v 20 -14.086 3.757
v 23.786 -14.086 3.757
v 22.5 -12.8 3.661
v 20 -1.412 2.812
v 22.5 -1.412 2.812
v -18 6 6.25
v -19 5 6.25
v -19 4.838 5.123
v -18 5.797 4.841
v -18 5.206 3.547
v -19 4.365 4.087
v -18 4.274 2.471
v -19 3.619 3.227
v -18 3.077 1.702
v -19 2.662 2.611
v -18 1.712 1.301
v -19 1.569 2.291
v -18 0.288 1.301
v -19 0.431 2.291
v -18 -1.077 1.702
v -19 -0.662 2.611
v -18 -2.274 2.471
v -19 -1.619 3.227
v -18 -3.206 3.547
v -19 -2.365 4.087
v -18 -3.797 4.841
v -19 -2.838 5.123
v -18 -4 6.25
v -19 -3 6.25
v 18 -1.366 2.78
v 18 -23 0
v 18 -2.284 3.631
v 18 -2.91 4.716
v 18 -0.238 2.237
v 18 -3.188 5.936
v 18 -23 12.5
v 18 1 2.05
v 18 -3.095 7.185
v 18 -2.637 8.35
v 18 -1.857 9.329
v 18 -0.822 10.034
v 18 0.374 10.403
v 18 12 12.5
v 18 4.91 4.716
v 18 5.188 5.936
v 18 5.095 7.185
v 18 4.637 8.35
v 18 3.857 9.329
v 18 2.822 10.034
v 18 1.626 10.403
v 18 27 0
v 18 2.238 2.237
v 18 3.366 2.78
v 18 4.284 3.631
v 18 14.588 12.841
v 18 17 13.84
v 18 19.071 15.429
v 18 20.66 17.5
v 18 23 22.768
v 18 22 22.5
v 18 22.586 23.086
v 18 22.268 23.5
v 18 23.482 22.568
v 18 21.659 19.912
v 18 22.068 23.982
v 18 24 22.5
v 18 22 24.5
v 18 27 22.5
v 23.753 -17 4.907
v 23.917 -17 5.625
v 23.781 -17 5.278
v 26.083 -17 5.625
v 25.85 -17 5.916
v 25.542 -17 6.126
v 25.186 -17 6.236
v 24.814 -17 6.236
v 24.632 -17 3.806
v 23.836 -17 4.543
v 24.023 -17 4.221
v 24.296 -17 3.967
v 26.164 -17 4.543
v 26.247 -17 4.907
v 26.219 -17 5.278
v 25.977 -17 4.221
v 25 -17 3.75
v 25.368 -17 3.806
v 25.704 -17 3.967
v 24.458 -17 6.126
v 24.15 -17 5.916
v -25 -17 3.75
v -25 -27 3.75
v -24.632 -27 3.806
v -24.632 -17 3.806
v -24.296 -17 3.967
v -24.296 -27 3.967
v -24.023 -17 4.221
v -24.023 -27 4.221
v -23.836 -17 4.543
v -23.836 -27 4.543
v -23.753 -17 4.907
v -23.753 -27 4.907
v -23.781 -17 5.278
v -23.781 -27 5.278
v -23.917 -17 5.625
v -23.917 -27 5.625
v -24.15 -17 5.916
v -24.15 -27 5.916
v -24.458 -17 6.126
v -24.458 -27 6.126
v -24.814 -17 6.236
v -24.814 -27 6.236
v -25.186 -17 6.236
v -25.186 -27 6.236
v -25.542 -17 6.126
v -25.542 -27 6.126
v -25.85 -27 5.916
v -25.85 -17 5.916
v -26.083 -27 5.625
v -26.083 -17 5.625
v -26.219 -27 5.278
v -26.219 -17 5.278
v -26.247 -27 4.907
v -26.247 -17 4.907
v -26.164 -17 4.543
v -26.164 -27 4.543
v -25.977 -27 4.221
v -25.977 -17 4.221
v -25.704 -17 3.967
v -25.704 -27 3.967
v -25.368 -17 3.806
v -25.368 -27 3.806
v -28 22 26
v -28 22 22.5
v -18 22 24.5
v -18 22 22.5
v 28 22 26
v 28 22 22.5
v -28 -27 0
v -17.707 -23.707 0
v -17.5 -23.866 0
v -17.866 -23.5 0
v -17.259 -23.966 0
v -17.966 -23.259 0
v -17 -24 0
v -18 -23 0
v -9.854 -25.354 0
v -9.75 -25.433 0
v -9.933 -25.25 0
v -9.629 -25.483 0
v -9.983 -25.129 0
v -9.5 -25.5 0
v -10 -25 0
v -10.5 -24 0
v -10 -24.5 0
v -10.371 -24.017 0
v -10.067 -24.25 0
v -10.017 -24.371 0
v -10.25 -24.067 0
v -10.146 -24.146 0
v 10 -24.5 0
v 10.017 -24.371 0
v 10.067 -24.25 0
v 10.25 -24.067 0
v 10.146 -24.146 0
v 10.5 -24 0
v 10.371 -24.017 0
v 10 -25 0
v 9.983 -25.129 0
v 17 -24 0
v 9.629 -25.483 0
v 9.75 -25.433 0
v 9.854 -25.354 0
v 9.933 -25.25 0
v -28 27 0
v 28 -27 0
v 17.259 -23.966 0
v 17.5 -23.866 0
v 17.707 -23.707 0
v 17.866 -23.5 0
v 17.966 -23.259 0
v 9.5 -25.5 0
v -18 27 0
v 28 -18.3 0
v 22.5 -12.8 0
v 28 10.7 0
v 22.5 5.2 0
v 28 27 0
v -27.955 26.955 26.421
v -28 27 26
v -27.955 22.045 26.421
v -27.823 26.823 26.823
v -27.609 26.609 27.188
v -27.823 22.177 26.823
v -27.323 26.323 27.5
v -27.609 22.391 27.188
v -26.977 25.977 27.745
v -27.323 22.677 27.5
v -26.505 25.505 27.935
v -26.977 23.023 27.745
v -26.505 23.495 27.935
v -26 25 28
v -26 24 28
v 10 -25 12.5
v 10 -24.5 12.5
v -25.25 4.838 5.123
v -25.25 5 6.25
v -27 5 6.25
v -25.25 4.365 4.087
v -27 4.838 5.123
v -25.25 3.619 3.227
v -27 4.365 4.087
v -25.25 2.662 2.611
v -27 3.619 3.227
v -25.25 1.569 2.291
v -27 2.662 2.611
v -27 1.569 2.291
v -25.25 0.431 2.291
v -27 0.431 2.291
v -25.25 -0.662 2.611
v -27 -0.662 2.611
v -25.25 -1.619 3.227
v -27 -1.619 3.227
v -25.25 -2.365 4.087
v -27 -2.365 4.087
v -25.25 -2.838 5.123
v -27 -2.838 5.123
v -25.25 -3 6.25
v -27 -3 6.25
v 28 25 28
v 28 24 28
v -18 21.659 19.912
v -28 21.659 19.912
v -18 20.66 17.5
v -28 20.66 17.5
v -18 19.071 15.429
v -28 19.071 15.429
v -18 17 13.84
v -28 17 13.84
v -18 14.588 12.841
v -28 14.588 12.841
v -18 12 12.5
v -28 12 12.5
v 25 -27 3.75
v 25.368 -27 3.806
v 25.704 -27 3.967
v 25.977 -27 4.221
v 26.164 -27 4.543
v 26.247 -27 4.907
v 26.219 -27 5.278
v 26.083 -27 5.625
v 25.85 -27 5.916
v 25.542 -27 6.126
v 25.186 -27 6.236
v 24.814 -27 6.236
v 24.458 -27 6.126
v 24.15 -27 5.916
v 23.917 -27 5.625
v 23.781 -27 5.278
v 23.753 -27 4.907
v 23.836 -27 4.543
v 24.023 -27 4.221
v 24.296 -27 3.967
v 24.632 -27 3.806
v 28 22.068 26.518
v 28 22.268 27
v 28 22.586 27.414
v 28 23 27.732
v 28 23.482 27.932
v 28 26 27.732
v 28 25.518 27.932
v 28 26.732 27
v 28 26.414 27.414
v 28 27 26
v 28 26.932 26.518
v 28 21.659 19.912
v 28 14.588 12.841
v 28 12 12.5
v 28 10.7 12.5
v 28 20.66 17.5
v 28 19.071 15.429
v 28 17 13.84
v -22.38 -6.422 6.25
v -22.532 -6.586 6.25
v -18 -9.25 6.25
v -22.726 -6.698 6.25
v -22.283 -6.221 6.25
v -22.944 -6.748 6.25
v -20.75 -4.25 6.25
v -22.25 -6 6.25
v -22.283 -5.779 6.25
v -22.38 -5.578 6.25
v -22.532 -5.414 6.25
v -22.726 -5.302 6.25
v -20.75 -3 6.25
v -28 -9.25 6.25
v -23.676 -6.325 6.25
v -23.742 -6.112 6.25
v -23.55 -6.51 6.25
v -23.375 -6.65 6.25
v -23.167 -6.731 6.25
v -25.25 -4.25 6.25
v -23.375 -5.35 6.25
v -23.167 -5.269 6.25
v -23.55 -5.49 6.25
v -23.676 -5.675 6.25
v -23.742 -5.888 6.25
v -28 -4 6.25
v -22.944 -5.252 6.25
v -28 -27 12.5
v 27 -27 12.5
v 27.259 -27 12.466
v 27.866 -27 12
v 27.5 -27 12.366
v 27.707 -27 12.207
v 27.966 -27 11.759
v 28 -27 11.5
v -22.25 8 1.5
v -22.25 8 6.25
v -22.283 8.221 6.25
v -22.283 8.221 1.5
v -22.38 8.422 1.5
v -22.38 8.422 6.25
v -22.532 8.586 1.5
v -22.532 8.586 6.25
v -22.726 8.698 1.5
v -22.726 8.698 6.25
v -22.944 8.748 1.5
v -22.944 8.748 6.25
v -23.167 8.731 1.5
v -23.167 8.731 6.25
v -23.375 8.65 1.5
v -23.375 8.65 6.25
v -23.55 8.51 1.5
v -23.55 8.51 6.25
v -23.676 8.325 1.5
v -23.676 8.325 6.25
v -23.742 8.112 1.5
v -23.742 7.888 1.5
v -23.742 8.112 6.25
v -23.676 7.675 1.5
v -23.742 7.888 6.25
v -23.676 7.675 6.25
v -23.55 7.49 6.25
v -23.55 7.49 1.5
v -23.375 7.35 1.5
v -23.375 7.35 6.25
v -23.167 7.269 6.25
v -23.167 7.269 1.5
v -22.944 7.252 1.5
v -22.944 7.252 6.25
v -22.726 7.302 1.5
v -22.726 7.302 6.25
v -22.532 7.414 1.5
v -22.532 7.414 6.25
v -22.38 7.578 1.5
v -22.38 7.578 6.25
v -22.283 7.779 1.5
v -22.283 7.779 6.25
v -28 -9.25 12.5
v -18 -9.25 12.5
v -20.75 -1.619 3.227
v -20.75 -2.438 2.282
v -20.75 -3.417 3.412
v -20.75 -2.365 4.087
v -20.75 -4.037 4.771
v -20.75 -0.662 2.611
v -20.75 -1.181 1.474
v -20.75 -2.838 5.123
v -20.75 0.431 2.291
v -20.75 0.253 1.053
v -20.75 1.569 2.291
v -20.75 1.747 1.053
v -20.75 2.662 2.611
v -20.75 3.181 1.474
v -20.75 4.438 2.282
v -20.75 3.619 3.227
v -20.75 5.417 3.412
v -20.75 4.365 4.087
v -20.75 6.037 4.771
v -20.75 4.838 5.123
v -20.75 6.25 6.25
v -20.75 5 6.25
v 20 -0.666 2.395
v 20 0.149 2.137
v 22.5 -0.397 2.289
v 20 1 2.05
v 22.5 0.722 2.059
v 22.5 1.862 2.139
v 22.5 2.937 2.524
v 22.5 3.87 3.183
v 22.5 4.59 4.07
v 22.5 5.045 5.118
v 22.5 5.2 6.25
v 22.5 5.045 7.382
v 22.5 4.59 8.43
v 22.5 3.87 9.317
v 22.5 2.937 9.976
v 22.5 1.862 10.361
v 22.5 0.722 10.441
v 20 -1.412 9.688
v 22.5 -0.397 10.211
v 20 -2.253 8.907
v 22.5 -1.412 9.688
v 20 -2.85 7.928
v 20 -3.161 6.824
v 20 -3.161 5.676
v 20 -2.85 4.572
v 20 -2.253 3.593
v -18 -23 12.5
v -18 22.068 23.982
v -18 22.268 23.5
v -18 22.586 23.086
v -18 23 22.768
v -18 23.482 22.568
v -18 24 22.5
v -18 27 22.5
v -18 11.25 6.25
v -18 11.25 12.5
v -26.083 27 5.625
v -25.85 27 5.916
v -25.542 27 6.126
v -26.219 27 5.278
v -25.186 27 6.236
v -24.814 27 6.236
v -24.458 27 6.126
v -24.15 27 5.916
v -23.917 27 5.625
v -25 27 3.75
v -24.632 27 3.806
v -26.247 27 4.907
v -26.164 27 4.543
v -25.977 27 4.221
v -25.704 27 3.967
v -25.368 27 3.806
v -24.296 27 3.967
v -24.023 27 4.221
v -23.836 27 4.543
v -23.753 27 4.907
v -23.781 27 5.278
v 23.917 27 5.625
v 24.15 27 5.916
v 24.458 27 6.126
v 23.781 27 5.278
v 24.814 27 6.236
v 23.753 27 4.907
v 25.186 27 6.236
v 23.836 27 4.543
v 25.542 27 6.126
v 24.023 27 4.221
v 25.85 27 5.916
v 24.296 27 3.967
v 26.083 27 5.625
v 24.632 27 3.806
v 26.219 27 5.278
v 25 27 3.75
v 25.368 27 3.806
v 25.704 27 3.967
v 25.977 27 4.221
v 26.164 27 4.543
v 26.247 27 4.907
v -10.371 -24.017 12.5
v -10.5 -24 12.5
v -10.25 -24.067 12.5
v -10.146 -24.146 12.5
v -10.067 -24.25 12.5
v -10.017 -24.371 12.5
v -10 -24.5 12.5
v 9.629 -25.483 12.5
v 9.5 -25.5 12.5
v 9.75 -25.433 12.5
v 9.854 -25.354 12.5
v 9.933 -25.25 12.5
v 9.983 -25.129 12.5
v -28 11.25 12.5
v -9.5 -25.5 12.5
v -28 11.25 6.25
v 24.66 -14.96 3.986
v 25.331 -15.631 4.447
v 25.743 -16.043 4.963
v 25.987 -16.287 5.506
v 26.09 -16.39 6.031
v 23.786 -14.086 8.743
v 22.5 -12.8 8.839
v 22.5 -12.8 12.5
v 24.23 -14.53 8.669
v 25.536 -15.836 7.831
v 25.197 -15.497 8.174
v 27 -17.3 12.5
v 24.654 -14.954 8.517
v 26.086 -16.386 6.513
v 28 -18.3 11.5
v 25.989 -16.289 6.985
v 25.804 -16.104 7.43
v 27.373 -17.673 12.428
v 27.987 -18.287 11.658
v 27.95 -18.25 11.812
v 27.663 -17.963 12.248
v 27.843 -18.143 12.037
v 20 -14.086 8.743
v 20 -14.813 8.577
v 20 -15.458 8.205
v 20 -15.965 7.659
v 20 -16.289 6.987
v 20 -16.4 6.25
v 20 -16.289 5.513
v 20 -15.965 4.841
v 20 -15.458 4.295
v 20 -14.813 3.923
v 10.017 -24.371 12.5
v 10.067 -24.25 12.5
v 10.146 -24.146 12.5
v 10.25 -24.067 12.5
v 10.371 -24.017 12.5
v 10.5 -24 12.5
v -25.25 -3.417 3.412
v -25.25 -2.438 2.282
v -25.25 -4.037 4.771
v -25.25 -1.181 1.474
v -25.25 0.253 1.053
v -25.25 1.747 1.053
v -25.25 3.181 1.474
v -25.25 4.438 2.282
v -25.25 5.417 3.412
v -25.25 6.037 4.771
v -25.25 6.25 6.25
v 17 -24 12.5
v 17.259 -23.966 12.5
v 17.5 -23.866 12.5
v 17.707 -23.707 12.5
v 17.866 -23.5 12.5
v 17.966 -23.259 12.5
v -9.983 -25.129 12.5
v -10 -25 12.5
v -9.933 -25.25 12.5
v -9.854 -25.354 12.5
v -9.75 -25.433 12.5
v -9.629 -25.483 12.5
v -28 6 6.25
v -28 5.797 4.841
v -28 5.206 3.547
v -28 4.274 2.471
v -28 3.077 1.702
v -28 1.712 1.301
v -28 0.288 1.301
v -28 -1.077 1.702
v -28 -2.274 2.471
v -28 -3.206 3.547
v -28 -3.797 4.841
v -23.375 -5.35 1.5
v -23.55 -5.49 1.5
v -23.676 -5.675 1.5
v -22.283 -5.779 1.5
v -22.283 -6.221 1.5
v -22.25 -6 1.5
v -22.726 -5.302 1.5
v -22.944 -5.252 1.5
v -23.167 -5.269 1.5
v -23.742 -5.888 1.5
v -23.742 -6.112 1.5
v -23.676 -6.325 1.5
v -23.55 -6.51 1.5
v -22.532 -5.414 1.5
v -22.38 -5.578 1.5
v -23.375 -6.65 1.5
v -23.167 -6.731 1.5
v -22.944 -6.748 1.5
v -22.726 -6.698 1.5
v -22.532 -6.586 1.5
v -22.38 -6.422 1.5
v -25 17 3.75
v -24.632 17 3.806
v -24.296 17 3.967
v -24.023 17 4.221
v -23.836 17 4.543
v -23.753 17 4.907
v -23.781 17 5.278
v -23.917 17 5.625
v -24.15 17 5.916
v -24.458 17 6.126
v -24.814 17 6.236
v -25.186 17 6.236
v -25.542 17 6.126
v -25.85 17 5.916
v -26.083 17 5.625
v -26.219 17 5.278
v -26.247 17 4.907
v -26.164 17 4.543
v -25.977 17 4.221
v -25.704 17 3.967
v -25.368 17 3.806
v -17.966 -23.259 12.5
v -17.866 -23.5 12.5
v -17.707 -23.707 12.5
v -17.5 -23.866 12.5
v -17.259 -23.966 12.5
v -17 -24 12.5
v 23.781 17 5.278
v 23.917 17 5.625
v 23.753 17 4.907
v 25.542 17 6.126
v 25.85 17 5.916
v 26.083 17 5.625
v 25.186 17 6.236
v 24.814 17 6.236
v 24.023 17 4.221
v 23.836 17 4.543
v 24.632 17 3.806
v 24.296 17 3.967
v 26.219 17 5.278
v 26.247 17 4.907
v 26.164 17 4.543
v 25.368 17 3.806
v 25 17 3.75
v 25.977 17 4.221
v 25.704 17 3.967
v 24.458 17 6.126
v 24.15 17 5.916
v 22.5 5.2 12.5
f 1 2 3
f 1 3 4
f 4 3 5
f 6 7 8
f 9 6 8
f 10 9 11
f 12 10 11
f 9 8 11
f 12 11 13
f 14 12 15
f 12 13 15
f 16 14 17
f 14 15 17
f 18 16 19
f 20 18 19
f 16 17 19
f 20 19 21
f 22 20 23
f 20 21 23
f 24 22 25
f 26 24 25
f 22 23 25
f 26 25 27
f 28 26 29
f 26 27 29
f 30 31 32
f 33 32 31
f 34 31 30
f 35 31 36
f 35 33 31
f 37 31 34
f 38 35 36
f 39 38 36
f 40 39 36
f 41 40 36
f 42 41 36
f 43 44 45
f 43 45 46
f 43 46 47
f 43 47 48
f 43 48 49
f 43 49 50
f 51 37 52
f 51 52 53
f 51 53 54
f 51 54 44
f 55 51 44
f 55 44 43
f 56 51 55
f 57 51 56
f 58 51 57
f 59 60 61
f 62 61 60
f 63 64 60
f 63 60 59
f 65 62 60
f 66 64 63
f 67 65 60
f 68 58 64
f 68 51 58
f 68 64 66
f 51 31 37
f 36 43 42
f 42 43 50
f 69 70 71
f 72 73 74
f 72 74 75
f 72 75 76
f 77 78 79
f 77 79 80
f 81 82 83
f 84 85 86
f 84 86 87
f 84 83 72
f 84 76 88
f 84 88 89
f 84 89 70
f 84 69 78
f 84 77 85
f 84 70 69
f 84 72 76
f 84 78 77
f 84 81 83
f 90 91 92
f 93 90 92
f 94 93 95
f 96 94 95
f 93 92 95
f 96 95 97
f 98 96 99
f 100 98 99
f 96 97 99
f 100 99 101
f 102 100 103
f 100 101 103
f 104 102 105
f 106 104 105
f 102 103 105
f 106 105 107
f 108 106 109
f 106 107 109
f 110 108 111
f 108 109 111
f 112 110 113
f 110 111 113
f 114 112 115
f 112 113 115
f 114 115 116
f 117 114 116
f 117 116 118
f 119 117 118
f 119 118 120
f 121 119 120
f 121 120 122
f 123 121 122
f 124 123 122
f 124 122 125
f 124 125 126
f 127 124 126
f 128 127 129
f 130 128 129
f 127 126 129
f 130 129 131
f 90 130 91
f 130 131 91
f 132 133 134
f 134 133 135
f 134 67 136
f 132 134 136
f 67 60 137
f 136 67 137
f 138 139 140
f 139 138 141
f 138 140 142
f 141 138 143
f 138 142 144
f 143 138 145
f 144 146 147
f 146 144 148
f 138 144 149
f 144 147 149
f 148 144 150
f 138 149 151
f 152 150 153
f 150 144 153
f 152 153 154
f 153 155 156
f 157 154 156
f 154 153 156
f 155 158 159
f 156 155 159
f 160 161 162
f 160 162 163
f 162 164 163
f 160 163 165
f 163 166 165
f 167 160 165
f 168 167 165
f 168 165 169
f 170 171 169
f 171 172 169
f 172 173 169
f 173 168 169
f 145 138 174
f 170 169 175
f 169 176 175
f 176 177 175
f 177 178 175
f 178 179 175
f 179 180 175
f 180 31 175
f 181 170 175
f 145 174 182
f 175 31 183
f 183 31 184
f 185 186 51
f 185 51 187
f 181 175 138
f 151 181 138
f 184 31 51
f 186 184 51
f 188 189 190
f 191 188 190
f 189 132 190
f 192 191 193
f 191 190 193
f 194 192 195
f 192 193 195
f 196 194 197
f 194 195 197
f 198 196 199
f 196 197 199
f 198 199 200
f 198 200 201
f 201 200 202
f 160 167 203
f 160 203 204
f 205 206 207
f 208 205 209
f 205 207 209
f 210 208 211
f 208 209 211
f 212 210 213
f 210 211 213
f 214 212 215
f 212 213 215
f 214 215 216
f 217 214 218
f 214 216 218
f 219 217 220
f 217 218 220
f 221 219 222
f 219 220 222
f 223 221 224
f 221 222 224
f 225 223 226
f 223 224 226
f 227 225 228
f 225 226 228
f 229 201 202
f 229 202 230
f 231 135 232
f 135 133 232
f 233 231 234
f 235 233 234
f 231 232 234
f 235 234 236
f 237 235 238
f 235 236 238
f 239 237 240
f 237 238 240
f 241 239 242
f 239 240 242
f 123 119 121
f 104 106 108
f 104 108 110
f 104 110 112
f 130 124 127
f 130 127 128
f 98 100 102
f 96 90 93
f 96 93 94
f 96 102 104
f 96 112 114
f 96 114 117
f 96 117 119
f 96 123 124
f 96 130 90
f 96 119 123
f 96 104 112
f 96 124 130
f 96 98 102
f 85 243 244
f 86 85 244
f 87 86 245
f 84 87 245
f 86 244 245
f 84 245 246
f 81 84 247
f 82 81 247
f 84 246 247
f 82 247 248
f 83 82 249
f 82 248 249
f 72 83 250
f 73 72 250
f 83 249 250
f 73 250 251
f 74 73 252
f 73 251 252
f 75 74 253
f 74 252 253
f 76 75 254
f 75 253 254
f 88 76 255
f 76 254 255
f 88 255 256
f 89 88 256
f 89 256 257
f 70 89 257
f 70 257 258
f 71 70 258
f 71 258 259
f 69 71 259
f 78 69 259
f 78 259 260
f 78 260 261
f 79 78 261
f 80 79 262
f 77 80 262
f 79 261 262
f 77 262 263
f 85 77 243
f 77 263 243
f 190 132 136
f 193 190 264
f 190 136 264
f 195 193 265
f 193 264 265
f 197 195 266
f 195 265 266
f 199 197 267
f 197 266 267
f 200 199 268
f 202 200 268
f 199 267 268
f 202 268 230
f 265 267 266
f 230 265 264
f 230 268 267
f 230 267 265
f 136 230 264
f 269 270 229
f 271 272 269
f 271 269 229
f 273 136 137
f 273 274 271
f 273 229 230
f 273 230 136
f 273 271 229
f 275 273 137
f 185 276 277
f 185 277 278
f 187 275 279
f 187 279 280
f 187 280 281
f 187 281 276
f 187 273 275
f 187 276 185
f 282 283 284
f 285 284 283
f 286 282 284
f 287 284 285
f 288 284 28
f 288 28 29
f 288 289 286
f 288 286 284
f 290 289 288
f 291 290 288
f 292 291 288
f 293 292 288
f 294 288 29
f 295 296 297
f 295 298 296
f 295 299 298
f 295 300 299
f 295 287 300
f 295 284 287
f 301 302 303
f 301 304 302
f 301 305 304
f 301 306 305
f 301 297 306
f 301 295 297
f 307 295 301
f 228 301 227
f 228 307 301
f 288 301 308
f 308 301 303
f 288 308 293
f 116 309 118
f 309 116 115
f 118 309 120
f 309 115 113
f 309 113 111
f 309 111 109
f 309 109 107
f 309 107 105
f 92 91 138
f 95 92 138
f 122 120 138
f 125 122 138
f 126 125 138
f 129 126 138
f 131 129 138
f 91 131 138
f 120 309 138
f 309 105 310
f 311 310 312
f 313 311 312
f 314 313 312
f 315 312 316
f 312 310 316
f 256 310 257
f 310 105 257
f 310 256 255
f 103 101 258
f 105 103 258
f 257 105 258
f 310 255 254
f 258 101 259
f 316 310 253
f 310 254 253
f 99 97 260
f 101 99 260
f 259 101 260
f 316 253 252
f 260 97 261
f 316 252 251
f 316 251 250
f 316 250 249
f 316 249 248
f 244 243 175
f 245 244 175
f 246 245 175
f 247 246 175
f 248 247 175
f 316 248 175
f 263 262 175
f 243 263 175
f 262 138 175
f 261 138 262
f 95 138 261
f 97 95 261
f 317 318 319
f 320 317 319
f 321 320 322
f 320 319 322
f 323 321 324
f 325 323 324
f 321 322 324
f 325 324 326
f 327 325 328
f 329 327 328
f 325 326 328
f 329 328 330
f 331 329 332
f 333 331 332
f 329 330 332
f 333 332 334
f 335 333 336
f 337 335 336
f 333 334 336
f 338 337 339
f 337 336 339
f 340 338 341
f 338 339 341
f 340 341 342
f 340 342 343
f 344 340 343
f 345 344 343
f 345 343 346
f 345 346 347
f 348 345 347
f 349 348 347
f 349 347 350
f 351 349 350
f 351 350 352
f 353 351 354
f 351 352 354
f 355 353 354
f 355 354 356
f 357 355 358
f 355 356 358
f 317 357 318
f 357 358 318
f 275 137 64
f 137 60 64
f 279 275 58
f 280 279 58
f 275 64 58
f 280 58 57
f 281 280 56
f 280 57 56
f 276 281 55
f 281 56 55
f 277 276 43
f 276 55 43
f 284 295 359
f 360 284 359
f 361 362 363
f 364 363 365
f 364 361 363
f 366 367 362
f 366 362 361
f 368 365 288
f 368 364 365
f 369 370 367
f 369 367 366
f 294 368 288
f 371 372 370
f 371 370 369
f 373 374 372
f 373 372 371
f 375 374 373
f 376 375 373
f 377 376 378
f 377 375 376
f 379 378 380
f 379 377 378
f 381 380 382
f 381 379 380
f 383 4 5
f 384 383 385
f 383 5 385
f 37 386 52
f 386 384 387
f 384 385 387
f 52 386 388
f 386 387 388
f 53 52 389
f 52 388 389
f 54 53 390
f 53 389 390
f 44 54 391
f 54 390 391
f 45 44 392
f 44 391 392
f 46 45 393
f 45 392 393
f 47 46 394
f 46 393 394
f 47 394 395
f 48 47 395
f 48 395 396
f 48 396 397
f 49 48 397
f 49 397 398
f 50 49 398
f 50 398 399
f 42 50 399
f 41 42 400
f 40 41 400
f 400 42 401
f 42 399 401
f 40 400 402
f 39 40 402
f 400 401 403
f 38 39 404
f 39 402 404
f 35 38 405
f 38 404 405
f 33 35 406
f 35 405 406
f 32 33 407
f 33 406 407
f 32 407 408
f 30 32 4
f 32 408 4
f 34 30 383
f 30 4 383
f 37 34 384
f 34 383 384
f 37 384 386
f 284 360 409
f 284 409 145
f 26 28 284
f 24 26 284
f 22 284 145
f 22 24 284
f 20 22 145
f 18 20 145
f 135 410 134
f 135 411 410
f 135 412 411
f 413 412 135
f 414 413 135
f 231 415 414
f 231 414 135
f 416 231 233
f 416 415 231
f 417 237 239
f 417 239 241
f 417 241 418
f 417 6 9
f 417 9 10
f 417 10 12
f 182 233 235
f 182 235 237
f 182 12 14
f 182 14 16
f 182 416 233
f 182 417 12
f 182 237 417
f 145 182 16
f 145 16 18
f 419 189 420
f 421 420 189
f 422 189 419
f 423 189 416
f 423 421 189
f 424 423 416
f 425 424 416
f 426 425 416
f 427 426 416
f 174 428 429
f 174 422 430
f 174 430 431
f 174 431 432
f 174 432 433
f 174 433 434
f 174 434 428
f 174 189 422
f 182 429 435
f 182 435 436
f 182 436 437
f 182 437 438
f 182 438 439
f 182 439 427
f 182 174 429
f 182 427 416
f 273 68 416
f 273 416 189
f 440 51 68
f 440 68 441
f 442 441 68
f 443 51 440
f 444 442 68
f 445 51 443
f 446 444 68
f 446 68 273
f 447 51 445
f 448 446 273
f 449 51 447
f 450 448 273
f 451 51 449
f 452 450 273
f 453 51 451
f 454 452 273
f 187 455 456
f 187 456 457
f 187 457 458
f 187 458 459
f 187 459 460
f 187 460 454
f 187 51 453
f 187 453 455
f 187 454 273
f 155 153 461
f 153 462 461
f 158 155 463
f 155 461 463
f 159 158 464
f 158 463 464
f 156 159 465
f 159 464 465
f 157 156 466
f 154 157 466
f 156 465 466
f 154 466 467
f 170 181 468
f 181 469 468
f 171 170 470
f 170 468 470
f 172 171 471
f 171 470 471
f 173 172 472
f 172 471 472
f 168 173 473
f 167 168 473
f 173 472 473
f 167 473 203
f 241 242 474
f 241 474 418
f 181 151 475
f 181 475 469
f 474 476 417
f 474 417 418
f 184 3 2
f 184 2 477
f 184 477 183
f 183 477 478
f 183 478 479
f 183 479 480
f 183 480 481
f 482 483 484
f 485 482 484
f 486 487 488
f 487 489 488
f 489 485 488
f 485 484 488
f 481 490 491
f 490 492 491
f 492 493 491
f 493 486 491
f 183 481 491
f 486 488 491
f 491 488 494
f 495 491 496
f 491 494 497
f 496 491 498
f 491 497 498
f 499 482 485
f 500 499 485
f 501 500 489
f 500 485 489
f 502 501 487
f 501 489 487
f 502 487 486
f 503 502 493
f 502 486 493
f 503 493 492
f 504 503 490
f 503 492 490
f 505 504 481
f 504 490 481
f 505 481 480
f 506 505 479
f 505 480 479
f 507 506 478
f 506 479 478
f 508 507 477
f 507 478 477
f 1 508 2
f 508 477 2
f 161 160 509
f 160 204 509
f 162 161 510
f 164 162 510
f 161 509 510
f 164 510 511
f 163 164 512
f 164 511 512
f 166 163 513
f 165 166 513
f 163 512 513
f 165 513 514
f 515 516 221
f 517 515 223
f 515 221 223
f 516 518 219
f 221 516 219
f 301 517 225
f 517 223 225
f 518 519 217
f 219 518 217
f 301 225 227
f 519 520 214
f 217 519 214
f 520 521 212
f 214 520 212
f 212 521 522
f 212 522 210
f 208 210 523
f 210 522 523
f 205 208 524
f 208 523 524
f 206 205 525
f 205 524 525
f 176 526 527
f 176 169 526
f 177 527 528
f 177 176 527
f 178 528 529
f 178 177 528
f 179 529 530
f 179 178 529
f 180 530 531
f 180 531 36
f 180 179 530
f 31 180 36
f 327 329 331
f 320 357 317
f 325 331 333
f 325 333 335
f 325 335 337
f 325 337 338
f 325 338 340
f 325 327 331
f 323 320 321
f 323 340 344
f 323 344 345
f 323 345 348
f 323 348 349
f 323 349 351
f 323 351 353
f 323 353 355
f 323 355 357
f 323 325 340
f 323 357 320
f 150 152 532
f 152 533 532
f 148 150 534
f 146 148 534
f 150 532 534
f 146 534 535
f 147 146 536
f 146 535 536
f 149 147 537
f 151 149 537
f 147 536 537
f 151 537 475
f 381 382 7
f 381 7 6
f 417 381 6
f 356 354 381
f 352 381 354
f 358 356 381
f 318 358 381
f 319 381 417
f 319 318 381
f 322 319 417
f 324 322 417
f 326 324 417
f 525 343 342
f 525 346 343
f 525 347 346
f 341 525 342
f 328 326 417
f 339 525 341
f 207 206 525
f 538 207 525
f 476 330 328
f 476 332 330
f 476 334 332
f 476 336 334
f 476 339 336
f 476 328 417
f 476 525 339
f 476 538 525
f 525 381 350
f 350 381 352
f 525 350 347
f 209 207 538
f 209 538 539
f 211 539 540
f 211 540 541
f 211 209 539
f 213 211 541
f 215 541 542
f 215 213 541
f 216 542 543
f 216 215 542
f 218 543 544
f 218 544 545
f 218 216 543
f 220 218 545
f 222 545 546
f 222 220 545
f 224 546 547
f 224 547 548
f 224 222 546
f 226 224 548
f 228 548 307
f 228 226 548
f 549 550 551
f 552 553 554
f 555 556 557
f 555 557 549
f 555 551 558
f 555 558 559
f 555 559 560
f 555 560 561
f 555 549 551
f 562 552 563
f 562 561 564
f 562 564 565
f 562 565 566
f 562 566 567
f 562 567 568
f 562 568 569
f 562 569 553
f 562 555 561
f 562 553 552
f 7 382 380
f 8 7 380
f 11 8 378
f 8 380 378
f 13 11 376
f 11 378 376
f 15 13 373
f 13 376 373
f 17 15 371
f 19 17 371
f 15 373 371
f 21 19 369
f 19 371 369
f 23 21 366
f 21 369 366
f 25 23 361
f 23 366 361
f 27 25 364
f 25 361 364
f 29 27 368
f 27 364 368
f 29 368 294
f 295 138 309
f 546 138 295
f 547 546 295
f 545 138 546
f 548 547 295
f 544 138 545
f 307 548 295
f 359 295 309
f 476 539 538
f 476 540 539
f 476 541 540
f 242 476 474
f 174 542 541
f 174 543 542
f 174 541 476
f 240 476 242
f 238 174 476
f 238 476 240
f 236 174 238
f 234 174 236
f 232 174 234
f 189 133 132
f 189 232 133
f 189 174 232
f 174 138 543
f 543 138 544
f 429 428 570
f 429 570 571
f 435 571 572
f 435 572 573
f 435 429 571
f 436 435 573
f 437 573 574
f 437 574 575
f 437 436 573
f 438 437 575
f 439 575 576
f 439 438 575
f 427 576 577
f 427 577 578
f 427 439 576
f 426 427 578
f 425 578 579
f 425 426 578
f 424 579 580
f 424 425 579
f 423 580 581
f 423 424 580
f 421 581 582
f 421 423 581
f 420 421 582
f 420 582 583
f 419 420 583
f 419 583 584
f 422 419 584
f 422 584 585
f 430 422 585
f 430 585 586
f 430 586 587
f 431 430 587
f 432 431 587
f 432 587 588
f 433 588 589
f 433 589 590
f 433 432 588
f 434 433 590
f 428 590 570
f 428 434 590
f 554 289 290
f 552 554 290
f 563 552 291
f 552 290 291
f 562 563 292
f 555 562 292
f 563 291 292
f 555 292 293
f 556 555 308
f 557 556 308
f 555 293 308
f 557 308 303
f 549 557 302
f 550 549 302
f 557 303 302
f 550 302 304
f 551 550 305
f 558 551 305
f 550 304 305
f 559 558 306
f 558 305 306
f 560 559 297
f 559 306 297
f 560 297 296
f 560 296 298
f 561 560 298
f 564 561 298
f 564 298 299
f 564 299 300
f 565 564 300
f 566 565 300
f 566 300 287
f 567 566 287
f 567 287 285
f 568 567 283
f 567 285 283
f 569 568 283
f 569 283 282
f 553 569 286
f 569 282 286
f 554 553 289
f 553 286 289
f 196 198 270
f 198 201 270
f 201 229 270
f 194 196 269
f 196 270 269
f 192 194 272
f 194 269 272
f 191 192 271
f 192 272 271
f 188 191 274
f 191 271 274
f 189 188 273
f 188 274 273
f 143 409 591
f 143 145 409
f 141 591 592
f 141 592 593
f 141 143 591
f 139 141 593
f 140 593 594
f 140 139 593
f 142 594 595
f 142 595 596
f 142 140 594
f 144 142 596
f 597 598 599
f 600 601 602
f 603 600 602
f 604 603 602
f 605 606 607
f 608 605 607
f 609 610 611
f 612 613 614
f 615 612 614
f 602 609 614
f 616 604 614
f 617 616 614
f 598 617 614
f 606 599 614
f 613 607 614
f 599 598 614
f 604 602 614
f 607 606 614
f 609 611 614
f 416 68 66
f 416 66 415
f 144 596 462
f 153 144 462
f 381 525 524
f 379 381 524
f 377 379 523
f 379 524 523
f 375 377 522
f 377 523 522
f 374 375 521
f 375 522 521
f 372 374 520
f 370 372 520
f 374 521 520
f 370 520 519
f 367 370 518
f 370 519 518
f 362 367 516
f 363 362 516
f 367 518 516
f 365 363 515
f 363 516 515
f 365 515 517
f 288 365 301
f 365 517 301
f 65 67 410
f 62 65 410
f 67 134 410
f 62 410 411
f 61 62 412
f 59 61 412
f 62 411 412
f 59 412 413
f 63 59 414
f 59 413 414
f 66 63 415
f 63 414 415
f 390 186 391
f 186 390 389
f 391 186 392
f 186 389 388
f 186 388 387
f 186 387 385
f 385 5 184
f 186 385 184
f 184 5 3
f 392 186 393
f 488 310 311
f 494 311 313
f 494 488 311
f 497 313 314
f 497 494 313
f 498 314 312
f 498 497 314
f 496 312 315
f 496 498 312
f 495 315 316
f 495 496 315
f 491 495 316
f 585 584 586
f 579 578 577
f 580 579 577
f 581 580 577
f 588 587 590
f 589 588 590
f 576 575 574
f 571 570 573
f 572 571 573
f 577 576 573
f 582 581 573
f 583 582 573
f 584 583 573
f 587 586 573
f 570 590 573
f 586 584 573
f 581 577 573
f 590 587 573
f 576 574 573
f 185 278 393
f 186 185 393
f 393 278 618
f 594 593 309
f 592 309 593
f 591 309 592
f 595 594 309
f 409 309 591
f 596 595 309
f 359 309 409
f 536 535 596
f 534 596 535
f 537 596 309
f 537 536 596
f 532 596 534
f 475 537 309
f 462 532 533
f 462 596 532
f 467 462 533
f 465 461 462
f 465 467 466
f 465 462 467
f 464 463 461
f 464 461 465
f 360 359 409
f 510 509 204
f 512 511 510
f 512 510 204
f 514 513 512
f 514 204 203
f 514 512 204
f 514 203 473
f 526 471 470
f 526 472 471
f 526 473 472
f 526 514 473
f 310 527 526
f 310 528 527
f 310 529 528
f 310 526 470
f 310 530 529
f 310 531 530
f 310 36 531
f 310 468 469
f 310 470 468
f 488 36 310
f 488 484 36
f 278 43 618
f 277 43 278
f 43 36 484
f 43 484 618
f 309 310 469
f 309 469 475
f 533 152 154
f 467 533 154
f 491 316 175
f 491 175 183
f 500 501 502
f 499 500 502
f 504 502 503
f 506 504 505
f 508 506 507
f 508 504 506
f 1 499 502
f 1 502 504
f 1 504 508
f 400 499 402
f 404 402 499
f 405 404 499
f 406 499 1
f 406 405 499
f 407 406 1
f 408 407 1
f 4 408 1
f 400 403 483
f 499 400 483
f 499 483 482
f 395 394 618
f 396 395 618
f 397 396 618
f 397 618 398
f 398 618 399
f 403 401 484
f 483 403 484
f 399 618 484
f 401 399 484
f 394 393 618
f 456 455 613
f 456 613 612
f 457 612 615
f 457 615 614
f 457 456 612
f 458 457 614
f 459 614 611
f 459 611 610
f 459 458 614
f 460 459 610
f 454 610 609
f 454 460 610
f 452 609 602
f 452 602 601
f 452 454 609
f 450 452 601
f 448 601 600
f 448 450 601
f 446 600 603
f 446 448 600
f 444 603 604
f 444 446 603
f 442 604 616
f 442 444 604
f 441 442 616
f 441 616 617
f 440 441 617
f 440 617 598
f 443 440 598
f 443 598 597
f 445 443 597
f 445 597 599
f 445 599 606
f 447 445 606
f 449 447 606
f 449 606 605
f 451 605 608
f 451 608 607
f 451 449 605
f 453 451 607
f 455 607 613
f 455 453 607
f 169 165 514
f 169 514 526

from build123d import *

# Parameters (mm, degrees)
SKETCH_1_W             = 56
SKETCH_1_H             = 54
EXTRUDE_492_DEPTH      = 12.5
SKETCH_3_W             = 36
SKETCH_3_H             = 46
CUT_EXTRUDE_735_DEPTH  = 41.856456038
SKETCH_11_R            = 1.25
CUT_EXTRUDE_988_DEPTH  = 10
CUT_EXTRUDE_1455_DEPTH = 8
CUT_EXTRUDE_1797_REACH = 65.413
SKETCH_4_R             = 4.2
SKETCH_6_R             = 4
CUT_EXTRUDE_1934_DEPTH = 10
SKETCH_7_W             = 6.25
SKETCH_7_H             = 20.5
CUT_EXTRUDE_2133_DEPTH = 10
SKETCH_8_R             = 5.25
CUT_EXTRUDE_2310_DEPTH = 2.25
SKETCH_9_R             = 0.75
CUT_EXTRUDE_2668_DEPTH = 4.75
CUT_EXTRUDE_3065_DEPTH = 41.856456038
CHAMFER_1_SIZE         = 1
FILLET_1_R             = 1
SKETCH_12_W            = 20
SKETCH_12_H            = 1.5
CUT_EXTRUDE_3477_DEPTH = 41.856456038
FILLET_2_R             = 0.5
CUT_EXTRUDE_4202_REACH = 42.856
SKETCH_13_W            = 36
SKETCH_13_H            = 5
EXTRUDE_4562_DEPTH     = 5
FILLET_3_R             = 10
FILLET_4_R             = 2
FILLET_6_R             = 1


with BuildPart() as part:
    # Эскиз1 → Extrude 492 (new body)
    with BuildSketch(Plane.XY):
        Rectangle(SKETCH_1_W, SKETCH_1_H)
    extrude(amount=EXTRUDE_492_DEPTH)

    # Эскиз3 → Cut-Extrude 735 (cut, through all)
    with BuildSketch(Plane.XY.offset(12.5)):
        with Locations((0, -1)):
            Rectangle(SKETCH_3_W, SKETCH_3_H)
    extrude(amount=-CUT_EXTRUDE_735_DEPTH, mode=Mode.SUBTRACT)

    # Эскиз11 → Cut-Extrude 988 (cut)
    with BuildSketch(Plane.XZ.offset(27)):
        with Locations(Location((-25, 5, 0), (0, 0, 270))):
            Circle(SKETCH_11_R)
        with Locations(Location((25, 5, 0), (0, 0, 270))):
            Circle(SKETCH_11_R)
    cut_extrude_988 = extrude(amount=-CUT_EXTRUDE_988_DEPTH, mode=Mode.SUBTRACT)

    # Mirror 1032: Cut-Extrude 988 across plane
    add(cut_extrude_988.mirror(Plane.ZX), mode=Mode.SUBTRACT)

    # Эскиз5 → Cut-Extrude 1455 (cut)
    with BuildSketch(Plane(origin=(28, 0, 0), x_dir=(0, 0, -1), z_dir=(1, 0, 0))):
        with BuildLine():
            Line((-9.688027281, -1.412461071), (-8.743079599, -14.085887362))
            ThreePointArc((-8.743079599, -14.085887362), (-6.25, -16.4), (-3.756920401, -14.085887362))
            Line((-3.756920401, -14.085887362), (-2.811972719, -1.412461071))
            ThreePointArc((-2.811972719, -1.412461071), (-6.25, 5.2), (-9.688027281, -1.412461071))
        make_face()
    extrude(amount=-CUT_EXTRUDE_1455_DEPTH, mode=Mode.SUBTRACT)

    # Эскиз4 → Cut-Extrude 1797 (cut, up to next)
    with BuildSketch(Plane(origin=(28, 0, 0), x_dir=(0, 0, -1), z_dir=(1, 0, 0)), mode=Mode.PRIVATE) as cut_extrude_1797_sk1:
        with Locations((-6.25, 1)):
            Circle(SKETCH_4_R)
    cut_extrude_1797_tool1 = extrude(cut_extrude_1797_sk1.sketch, amount=-CUT_EXTRUDE_1797_REACH, mode=Mode.PRIVATE) & part.part
    add(cut_extrude_1797_tool1.solids().sort_by_distance((28, 1, 6.25))[0], mode=Mode.SUBTRACT)

    # Эскиз6 → Cut-Extrude 1934 (cut)
    with BuildSketch(Plane.ZY.offset(28)):
        with Locations((6.25, 1)):
            Circle(SKETCH_6_R)
    extrude(amount=-CUT_EXTRUDE_1934_DEPTH, mode=Mode.SUBTRACT)

    # Эскиз7 → Cut-Extrude 2133 (cut)
    with BuildSketch(Plane.ZY.offset(28)):
        with Locations((9.375, 1)):
            Rectangle(SKETCH_7_W, SKETCH_7_H)
    extrude(amount=-CUT_EXTRUDE_2133_DEPTH, mode=Mode.SUBTRACT)

    # Эскиз8 → Cut-Extrude 2310 (cut, symmetric)
    with BuildSketch(Plane.ZY.offset(23)):
        with Locations((6.25, 1)):
            Circle(SKETCH_8_R)
    extrude(amount=CUT_EXTRUDE_2310_DEPTH, both=True, mode=Mode.SUBTRACT)

    # Эскиз9 → Cut-Extrude 2668 (cut)
    with BuildSketch(Plane.XY.offset(6.25)):
        with Locations((-23, 8)):
            Circle(SKETCH_9_R)
        with Locations((-23, -6)):
            Circle(SKETCH_9_R)
    extrude(amount=-CUT_EXTRUDE_2668_DEPTH, mode=Mode.SUBTRACT)

    # Эскиз10 → Cut-Extrude 3065 (cut, through all)
    with BuildSketch(Plane.XY.offset(12.5)):
        Polygon((28, -18.3), (28, 10.7), (22.5, 5.2), (22.5, -12.8), align=None)
    extrude(amount=-CUT_EXTRUDE_3065_DEPTH, mode=Mode.SUBTRACT)

    # Фаска1
    chamfer_1_edges = [part.edges().sort_by_distance(p)[0] for p in [
        (-28, 1, 2.25),
        (-18, 1, 2.25),
    ]]
    chamfer(chamfer_1_edges, length=CHAMFER_1_SIZE)

    # Скругление1
    fillet_1_edges = [part.edges().sort_by_distance(p)[0] for p in [
        (18, -24, 6.25),
        (-18, -24, 6.25),
    ]]
    fillet(fillet_1_edges, radius=FILLET_1_R)

    # Эскиз12 → Cut-Extrude 3477 (cut, through all)
    with BuildSketch(Plane.XY):
        with Locations((0, -24.75)):
            Rectangle(SKETCH_12_W, SKETCH_12_H)
    extrude(amount=CUT_EXTRUDE_3477_DEPTH, mode=Mode.SUBTRACT)

    # Скругление2
    fillet_2_edges = [part.edges().sort_by_distance(p)[0] for p in [
        (-10, -24, 6.25),
        (-10, -25.5, 6.25),
        (10, -25.5, 6.25),
        (10, -24, 6.25),
    ]]
    fillet(fillet_2_edges, radius=FILLET_2_R)

    # Эскиз13 → Cut-Extrude 4202 (cut, up to next)
    with BuildSketch(Plane.XY.offset(12.5), mode=Mode.PRIVATE) as cut_extrude_4202_sk1:
        with Locations((0, 24.5)):
            Rectangle(SKETCH_13_W, SKETCH_13_H)
    cut_extrude_4202_tool1 = extrude(cut_extrude_4202_sk1.sketch, amount=-CUT_EXTRUDE_4202_REACH, mode=Mode.PRIVATE) & part.part
    add(cut_extrude_4202_tool1.solids().sort_by_distance((0, 24.5, 12.5))[0], mode=Mode.SUBTRACT)

    # Эскиз14 → Extrude 4562 (add)
    with BuildSketch(Plane(origin=(0, 27, 0), x_dir=(1, 0, 0), z_dir=(0, 1, 0))):
        Polygon((-28, -12.5), (-28, -28), (28, -28), (28, -12.5), (18, -12.5), (18, -22.5), (-18, -22.5), (-18, -12.5), align=None)
    extrude(amount=-EXTRUDE_4562_DEPTH)

    # Скругление3
    fillet_3_edges = [part.edges().sort_by_distance(p)[0] for p in [
        (23, 22, 12.5),
        (-23, 22, 12.5),
    ]]
    fillet(fillet_3_edges, radius=FILLET_3_R)

    # Скругление4
    fillet_4_edges = [part.edges().sort_by_distance(p)[0] for p in [
        (0, 22, 22.5),
        (0, 22, 28),
        (-28, 24.5, 28),
        (0, 27, 28),
    ]]
    fillet(fillet_4_edges, radius=FILLET_4_R)

    # Скругление6
    fillet_6_edges = [part.edges().sort_by_distance(p)[0] for p in [
        (28, -22.65, 12.5),
    ]]
    fillet(fillet_6_edges, radius=FILLET_6_R)


solid = part.part
